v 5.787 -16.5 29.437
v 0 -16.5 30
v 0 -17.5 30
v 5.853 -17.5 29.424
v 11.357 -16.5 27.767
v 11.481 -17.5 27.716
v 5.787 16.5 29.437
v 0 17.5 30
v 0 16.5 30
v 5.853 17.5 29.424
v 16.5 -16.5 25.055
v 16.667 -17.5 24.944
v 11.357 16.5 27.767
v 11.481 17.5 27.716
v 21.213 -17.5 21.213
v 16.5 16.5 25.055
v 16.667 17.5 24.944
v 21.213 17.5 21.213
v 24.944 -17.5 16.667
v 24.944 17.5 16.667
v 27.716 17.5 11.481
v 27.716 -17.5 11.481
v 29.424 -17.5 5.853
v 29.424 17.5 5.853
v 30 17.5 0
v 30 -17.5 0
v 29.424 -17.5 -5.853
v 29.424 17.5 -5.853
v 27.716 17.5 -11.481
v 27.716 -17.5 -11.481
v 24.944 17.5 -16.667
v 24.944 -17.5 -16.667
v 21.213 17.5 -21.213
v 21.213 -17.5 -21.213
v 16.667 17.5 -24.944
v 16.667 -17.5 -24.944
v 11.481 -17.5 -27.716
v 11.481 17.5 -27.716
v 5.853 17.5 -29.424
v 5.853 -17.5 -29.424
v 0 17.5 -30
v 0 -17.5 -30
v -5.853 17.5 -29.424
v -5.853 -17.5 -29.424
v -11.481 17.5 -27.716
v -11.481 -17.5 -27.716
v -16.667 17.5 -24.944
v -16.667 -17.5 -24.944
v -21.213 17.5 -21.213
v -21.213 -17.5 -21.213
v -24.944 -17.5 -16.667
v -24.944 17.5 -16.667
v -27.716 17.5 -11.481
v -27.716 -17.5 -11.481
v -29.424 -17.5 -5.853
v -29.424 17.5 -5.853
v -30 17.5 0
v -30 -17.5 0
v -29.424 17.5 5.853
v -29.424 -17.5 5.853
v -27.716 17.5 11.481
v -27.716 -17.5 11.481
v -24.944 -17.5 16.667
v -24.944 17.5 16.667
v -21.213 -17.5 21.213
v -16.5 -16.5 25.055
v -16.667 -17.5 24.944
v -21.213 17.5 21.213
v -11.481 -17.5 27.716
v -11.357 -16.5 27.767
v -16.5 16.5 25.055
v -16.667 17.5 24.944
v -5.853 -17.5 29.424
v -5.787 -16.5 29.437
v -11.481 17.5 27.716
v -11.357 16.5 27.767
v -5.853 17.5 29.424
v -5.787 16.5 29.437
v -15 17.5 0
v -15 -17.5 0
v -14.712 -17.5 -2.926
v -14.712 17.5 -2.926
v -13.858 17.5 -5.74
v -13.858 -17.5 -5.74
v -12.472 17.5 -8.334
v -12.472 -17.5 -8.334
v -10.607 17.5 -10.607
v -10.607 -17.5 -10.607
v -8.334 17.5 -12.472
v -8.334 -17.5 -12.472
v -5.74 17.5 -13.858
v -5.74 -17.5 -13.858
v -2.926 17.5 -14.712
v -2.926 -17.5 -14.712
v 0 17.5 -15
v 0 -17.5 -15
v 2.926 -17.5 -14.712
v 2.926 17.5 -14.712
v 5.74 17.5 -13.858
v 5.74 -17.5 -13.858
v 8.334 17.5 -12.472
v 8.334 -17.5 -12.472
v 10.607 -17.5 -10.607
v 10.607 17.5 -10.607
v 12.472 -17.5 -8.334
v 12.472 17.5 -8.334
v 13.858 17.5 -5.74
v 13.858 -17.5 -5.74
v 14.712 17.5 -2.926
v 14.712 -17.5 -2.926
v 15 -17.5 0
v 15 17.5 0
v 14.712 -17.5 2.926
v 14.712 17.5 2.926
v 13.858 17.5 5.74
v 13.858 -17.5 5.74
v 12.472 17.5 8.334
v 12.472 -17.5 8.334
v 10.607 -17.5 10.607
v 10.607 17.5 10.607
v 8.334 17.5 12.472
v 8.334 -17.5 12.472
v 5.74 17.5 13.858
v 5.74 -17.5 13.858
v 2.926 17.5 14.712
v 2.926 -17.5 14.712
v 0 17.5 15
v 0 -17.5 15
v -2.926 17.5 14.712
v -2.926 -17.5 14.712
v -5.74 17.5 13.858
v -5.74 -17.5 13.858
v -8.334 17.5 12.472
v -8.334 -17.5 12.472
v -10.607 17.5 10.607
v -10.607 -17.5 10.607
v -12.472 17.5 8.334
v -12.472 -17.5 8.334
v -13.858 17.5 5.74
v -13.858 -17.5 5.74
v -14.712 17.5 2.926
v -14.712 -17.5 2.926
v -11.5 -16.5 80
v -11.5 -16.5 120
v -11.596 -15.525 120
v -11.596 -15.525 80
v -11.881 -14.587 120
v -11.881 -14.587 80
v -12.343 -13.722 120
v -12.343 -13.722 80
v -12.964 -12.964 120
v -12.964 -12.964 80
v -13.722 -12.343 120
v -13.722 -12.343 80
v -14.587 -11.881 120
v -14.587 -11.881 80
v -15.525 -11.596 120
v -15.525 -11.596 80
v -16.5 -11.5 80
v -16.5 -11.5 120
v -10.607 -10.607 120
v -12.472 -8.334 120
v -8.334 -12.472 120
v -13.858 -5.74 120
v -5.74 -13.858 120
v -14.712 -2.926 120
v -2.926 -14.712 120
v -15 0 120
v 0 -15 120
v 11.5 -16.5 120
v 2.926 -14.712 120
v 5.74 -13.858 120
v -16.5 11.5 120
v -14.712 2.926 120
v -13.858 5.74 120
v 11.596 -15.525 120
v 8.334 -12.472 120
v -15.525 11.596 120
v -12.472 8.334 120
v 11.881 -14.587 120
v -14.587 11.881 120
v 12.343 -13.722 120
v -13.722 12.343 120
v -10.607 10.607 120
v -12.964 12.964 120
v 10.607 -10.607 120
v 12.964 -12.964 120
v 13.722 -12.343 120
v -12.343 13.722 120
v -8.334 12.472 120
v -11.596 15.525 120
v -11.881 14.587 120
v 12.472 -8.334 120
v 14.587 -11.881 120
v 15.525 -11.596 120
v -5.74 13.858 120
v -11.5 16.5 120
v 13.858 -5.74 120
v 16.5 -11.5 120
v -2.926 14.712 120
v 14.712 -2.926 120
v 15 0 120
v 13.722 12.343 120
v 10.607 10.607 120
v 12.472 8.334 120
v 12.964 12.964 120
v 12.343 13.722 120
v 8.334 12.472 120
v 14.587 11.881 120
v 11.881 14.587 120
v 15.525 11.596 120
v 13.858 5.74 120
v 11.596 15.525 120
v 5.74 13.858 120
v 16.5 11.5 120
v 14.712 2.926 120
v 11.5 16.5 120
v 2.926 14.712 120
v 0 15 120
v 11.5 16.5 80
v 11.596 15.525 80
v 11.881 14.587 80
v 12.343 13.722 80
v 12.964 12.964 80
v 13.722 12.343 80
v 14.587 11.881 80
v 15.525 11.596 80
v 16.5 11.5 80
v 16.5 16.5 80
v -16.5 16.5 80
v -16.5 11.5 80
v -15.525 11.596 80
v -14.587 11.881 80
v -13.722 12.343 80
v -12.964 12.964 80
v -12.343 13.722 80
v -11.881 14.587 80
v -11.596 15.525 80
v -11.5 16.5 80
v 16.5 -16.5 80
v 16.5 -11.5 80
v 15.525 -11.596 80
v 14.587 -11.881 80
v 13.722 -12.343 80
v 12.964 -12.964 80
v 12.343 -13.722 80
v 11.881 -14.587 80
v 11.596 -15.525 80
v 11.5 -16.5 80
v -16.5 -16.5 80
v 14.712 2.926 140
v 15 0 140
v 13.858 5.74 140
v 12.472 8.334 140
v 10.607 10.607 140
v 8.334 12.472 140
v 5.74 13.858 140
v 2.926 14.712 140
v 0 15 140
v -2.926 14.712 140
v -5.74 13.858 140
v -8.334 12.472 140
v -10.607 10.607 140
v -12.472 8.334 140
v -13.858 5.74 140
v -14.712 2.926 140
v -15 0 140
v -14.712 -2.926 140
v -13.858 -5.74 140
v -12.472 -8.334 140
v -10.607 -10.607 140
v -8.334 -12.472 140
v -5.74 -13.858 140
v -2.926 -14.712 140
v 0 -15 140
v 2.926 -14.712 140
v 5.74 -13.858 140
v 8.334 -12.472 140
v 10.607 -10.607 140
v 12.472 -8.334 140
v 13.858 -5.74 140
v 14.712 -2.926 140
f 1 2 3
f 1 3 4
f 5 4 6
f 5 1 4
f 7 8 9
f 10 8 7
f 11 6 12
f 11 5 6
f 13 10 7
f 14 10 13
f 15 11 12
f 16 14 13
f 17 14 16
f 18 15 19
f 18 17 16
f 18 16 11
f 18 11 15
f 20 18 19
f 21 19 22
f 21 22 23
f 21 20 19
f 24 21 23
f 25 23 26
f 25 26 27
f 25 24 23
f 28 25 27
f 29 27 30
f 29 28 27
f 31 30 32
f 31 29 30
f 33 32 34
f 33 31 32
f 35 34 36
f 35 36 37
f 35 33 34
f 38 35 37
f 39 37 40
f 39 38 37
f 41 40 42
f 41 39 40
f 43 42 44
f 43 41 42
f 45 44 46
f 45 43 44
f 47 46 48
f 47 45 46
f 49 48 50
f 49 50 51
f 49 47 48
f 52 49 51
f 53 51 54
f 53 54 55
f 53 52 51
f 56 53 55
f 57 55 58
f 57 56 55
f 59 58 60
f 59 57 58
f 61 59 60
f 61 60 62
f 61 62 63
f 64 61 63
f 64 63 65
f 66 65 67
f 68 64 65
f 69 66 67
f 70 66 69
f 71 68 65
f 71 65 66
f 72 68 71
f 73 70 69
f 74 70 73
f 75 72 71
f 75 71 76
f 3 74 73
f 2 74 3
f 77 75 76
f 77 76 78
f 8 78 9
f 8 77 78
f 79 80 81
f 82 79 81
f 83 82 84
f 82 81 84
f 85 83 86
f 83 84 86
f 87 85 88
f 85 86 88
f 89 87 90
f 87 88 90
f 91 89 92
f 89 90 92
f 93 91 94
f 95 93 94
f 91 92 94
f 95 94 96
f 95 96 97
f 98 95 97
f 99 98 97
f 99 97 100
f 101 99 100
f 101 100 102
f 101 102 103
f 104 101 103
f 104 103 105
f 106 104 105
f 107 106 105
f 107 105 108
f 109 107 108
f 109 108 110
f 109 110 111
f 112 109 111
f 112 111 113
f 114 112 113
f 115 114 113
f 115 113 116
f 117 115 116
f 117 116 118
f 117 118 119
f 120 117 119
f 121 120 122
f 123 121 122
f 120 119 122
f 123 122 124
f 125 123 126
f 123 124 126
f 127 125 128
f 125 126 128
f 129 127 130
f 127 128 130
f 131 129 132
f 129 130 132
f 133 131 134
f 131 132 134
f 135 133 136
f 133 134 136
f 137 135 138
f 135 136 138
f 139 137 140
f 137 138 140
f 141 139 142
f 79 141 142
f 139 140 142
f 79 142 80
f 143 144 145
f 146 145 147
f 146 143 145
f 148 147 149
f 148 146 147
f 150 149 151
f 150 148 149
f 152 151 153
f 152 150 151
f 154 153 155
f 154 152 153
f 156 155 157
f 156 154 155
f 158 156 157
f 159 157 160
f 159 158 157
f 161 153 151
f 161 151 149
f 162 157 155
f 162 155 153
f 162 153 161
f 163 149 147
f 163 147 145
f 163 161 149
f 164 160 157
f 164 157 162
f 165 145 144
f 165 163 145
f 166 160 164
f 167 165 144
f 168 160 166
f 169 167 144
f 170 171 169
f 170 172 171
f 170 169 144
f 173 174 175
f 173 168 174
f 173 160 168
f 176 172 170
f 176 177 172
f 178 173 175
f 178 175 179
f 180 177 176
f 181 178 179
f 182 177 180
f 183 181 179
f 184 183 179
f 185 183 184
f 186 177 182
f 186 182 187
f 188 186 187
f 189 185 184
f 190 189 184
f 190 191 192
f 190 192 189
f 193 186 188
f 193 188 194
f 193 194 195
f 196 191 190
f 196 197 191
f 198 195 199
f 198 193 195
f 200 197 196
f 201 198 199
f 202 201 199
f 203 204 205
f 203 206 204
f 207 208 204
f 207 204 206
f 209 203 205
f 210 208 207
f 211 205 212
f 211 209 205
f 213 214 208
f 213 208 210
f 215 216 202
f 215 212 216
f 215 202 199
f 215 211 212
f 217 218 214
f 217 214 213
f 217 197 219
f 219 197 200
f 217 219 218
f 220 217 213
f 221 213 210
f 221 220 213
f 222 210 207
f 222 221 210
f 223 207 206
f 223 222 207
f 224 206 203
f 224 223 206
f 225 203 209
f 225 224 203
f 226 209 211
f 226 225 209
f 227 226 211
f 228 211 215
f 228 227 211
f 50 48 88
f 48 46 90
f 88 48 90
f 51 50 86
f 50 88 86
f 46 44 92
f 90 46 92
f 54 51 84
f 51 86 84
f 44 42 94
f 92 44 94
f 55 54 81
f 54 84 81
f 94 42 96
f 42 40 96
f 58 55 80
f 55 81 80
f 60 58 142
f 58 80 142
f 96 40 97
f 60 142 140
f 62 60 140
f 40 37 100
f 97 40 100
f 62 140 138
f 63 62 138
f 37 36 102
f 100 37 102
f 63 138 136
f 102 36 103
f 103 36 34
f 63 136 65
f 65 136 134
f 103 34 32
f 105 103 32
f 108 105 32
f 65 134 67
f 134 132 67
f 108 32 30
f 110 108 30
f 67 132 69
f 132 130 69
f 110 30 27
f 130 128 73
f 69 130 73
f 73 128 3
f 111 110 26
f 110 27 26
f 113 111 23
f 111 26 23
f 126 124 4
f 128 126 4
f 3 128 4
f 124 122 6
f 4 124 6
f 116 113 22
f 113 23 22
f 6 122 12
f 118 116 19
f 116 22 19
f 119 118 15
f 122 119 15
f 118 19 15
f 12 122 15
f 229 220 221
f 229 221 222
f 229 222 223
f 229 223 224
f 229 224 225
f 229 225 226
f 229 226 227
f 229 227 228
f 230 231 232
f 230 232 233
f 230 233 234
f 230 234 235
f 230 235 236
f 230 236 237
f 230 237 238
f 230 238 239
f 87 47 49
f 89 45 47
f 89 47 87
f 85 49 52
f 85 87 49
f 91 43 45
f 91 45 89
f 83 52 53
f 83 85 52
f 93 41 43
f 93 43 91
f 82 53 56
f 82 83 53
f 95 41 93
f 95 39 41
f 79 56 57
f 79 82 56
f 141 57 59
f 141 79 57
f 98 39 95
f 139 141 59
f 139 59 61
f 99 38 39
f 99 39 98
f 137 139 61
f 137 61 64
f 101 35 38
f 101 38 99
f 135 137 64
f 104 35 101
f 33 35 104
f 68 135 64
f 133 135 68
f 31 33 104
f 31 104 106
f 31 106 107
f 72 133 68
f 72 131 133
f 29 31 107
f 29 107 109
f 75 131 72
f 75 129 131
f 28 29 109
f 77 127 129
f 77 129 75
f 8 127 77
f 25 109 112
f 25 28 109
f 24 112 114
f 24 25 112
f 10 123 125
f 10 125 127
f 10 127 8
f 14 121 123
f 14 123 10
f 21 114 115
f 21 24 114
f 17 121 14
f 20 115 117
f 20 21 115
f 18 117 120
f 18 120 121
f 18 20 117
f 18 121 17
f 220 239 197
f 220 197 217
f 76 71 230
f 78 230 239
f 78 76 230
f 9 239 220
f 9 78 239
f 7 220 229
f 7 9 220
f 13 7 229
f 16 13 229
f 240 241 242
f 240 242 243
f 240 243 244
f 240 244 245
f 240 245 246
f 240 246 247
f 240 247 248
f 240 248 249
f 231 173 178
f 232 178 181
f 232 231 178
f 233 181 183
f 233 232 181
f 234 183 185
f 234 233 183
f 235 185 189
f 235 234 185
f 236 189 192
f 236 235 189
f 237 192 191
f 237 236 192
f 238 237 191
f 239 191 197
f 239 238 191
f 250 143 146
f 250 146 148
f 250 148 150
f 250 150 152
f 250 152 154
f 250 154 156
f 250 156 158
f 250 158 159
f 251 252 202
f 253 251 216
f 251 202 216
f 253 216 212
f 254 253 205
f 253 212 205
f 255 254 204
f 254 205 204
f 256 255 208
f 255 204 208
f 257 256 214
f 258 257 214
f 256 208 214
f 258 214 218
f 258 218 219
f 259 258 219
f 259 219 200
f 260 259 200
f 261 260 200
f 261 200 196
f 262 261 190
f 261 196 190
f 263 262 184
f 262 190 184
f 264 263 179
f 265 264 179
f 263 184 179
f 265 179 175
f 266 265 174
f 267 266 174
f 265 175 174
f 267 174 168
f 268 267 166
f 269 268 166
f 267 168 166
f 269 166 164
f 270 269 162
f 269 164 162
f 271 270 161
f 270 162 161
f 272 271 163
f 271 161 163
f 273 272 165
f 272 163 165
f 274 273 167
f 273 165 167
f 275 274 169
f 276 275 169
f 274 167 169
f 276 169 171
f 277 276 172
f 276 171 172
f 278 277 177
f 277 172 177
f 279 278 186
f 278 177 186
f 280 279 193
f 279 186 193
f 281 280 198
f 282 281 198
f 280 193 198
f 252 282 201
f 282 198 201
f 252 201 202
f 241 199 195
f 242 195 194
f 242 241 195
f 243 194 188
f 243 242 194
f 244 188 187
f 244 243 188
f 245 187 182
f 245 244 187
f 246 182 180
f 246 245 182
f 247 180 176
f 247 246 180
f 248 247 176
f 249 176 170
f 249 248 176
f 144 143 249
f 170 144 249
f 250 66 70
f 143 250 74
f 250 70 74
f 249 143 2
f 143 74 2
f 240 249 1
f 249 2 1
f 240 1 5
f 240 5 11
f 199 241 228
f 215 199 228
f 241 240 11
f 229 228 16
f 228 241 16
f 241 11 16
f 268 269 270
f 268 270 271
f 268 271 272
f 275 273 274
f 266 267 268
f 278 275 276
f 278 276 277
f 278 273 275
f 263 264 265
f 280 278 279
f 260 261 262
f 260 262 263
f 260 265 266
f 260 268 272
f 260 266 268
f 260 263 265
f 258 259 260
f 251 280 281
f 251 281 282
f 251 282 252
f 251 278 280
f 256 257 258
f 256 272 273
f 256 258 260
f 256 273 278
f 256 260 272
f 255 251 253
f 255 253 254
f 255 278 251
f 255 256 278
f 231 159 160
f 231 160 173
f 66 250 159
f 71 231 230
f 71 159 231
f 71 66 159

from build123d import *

# Parameters (mm, degrees)
SKETCH1_R           = 30
BOSS_EXTRUDE1_DEPTH = 17.5
SKETCH2_W           = 33
SKETCH2_H           = 33
BOSS_EXTRUDE2_DEPTH = 120
SKETCH3_R           = 15
BOSS_EXTRUDE3_DEPTH = 20
CUT_EXTRUDE1_START  = -40
CUT_EXTRUDE1_DEPTH  = 194.968340902
CIRPATTERN1_COUNT   = 4
HOLE1_D             = 30


with BuildPart() as part:
    # Sketch1 → Boss-Extrude1 (new, symmetric)
    with BuildSketch(Plane(origin=(0, 0, 0), x_dir=(1, 0, 0), z_dir=(0, 1, 0))):
        with Locations(Location((0, 0, 0), (0, 0, 270))):
            Circle(SKETCH1_R)
    extrude(amount=BOSS_EXTRUDE1_DEPTH, both=True)

    # Sketch2 → Boss-Extrude2 (add)
    with BuildSketch(Plane.XY):
        Rectangle(SKETCH2_W, SKETCH2_H)
    extrude(amount=BOSS_EXTRUDE2_DEPTH)

    # Sketch3 → Boss-Extrude3 (add)
    with BuildSketch(Plane.XY.offset(120)):
        Circle(SKETCH3_R)
    extrude(amount=BOSS_EXTRUDE3_DEPTH)

    # Sketch4 → Cut-Extrude1 (cut)
    with BuildSketch(Plane.XY.offset(120).offset(CUT_EXTRUDE1_START)):
        with BuildLine():
            Line((16.5, 11.5), (16.5, 16.5))
            Line((16.5, 16.5), (11.5, 16.5))
            ThreePointArc((11.5, 16.5), (12.964466094, 12.964466094), (16.5, 11.5))
        make_face()
    cut_extrude1 = extrude(amount=CUT_EXTRUDE1_DEPTH, mode=Mode.SUBTRACT)

    # CirPattern1: Cut-Extrude1 ×4 about axis
    cirpattern1_axis = Axis((0, 0, 0), (0, 0, 1))
    for i in range(1, CIRPATTERN1_COUNT):
        add(cut_extrude1.rotate(cirpattern1_axis, i * 360 / CIRPATTERN1_COUNT), mode=Mode.SUBTRACT)

    # Hole1 (through all)
    with Locations(Plane(origin=(0, 17.5, 0), x_dir=(1, 0, 0), z_dir=(0, 1, 0))):
        with Locations((0, 0)):
            Hole(HOLE1_D / 2)


solid = part.part
